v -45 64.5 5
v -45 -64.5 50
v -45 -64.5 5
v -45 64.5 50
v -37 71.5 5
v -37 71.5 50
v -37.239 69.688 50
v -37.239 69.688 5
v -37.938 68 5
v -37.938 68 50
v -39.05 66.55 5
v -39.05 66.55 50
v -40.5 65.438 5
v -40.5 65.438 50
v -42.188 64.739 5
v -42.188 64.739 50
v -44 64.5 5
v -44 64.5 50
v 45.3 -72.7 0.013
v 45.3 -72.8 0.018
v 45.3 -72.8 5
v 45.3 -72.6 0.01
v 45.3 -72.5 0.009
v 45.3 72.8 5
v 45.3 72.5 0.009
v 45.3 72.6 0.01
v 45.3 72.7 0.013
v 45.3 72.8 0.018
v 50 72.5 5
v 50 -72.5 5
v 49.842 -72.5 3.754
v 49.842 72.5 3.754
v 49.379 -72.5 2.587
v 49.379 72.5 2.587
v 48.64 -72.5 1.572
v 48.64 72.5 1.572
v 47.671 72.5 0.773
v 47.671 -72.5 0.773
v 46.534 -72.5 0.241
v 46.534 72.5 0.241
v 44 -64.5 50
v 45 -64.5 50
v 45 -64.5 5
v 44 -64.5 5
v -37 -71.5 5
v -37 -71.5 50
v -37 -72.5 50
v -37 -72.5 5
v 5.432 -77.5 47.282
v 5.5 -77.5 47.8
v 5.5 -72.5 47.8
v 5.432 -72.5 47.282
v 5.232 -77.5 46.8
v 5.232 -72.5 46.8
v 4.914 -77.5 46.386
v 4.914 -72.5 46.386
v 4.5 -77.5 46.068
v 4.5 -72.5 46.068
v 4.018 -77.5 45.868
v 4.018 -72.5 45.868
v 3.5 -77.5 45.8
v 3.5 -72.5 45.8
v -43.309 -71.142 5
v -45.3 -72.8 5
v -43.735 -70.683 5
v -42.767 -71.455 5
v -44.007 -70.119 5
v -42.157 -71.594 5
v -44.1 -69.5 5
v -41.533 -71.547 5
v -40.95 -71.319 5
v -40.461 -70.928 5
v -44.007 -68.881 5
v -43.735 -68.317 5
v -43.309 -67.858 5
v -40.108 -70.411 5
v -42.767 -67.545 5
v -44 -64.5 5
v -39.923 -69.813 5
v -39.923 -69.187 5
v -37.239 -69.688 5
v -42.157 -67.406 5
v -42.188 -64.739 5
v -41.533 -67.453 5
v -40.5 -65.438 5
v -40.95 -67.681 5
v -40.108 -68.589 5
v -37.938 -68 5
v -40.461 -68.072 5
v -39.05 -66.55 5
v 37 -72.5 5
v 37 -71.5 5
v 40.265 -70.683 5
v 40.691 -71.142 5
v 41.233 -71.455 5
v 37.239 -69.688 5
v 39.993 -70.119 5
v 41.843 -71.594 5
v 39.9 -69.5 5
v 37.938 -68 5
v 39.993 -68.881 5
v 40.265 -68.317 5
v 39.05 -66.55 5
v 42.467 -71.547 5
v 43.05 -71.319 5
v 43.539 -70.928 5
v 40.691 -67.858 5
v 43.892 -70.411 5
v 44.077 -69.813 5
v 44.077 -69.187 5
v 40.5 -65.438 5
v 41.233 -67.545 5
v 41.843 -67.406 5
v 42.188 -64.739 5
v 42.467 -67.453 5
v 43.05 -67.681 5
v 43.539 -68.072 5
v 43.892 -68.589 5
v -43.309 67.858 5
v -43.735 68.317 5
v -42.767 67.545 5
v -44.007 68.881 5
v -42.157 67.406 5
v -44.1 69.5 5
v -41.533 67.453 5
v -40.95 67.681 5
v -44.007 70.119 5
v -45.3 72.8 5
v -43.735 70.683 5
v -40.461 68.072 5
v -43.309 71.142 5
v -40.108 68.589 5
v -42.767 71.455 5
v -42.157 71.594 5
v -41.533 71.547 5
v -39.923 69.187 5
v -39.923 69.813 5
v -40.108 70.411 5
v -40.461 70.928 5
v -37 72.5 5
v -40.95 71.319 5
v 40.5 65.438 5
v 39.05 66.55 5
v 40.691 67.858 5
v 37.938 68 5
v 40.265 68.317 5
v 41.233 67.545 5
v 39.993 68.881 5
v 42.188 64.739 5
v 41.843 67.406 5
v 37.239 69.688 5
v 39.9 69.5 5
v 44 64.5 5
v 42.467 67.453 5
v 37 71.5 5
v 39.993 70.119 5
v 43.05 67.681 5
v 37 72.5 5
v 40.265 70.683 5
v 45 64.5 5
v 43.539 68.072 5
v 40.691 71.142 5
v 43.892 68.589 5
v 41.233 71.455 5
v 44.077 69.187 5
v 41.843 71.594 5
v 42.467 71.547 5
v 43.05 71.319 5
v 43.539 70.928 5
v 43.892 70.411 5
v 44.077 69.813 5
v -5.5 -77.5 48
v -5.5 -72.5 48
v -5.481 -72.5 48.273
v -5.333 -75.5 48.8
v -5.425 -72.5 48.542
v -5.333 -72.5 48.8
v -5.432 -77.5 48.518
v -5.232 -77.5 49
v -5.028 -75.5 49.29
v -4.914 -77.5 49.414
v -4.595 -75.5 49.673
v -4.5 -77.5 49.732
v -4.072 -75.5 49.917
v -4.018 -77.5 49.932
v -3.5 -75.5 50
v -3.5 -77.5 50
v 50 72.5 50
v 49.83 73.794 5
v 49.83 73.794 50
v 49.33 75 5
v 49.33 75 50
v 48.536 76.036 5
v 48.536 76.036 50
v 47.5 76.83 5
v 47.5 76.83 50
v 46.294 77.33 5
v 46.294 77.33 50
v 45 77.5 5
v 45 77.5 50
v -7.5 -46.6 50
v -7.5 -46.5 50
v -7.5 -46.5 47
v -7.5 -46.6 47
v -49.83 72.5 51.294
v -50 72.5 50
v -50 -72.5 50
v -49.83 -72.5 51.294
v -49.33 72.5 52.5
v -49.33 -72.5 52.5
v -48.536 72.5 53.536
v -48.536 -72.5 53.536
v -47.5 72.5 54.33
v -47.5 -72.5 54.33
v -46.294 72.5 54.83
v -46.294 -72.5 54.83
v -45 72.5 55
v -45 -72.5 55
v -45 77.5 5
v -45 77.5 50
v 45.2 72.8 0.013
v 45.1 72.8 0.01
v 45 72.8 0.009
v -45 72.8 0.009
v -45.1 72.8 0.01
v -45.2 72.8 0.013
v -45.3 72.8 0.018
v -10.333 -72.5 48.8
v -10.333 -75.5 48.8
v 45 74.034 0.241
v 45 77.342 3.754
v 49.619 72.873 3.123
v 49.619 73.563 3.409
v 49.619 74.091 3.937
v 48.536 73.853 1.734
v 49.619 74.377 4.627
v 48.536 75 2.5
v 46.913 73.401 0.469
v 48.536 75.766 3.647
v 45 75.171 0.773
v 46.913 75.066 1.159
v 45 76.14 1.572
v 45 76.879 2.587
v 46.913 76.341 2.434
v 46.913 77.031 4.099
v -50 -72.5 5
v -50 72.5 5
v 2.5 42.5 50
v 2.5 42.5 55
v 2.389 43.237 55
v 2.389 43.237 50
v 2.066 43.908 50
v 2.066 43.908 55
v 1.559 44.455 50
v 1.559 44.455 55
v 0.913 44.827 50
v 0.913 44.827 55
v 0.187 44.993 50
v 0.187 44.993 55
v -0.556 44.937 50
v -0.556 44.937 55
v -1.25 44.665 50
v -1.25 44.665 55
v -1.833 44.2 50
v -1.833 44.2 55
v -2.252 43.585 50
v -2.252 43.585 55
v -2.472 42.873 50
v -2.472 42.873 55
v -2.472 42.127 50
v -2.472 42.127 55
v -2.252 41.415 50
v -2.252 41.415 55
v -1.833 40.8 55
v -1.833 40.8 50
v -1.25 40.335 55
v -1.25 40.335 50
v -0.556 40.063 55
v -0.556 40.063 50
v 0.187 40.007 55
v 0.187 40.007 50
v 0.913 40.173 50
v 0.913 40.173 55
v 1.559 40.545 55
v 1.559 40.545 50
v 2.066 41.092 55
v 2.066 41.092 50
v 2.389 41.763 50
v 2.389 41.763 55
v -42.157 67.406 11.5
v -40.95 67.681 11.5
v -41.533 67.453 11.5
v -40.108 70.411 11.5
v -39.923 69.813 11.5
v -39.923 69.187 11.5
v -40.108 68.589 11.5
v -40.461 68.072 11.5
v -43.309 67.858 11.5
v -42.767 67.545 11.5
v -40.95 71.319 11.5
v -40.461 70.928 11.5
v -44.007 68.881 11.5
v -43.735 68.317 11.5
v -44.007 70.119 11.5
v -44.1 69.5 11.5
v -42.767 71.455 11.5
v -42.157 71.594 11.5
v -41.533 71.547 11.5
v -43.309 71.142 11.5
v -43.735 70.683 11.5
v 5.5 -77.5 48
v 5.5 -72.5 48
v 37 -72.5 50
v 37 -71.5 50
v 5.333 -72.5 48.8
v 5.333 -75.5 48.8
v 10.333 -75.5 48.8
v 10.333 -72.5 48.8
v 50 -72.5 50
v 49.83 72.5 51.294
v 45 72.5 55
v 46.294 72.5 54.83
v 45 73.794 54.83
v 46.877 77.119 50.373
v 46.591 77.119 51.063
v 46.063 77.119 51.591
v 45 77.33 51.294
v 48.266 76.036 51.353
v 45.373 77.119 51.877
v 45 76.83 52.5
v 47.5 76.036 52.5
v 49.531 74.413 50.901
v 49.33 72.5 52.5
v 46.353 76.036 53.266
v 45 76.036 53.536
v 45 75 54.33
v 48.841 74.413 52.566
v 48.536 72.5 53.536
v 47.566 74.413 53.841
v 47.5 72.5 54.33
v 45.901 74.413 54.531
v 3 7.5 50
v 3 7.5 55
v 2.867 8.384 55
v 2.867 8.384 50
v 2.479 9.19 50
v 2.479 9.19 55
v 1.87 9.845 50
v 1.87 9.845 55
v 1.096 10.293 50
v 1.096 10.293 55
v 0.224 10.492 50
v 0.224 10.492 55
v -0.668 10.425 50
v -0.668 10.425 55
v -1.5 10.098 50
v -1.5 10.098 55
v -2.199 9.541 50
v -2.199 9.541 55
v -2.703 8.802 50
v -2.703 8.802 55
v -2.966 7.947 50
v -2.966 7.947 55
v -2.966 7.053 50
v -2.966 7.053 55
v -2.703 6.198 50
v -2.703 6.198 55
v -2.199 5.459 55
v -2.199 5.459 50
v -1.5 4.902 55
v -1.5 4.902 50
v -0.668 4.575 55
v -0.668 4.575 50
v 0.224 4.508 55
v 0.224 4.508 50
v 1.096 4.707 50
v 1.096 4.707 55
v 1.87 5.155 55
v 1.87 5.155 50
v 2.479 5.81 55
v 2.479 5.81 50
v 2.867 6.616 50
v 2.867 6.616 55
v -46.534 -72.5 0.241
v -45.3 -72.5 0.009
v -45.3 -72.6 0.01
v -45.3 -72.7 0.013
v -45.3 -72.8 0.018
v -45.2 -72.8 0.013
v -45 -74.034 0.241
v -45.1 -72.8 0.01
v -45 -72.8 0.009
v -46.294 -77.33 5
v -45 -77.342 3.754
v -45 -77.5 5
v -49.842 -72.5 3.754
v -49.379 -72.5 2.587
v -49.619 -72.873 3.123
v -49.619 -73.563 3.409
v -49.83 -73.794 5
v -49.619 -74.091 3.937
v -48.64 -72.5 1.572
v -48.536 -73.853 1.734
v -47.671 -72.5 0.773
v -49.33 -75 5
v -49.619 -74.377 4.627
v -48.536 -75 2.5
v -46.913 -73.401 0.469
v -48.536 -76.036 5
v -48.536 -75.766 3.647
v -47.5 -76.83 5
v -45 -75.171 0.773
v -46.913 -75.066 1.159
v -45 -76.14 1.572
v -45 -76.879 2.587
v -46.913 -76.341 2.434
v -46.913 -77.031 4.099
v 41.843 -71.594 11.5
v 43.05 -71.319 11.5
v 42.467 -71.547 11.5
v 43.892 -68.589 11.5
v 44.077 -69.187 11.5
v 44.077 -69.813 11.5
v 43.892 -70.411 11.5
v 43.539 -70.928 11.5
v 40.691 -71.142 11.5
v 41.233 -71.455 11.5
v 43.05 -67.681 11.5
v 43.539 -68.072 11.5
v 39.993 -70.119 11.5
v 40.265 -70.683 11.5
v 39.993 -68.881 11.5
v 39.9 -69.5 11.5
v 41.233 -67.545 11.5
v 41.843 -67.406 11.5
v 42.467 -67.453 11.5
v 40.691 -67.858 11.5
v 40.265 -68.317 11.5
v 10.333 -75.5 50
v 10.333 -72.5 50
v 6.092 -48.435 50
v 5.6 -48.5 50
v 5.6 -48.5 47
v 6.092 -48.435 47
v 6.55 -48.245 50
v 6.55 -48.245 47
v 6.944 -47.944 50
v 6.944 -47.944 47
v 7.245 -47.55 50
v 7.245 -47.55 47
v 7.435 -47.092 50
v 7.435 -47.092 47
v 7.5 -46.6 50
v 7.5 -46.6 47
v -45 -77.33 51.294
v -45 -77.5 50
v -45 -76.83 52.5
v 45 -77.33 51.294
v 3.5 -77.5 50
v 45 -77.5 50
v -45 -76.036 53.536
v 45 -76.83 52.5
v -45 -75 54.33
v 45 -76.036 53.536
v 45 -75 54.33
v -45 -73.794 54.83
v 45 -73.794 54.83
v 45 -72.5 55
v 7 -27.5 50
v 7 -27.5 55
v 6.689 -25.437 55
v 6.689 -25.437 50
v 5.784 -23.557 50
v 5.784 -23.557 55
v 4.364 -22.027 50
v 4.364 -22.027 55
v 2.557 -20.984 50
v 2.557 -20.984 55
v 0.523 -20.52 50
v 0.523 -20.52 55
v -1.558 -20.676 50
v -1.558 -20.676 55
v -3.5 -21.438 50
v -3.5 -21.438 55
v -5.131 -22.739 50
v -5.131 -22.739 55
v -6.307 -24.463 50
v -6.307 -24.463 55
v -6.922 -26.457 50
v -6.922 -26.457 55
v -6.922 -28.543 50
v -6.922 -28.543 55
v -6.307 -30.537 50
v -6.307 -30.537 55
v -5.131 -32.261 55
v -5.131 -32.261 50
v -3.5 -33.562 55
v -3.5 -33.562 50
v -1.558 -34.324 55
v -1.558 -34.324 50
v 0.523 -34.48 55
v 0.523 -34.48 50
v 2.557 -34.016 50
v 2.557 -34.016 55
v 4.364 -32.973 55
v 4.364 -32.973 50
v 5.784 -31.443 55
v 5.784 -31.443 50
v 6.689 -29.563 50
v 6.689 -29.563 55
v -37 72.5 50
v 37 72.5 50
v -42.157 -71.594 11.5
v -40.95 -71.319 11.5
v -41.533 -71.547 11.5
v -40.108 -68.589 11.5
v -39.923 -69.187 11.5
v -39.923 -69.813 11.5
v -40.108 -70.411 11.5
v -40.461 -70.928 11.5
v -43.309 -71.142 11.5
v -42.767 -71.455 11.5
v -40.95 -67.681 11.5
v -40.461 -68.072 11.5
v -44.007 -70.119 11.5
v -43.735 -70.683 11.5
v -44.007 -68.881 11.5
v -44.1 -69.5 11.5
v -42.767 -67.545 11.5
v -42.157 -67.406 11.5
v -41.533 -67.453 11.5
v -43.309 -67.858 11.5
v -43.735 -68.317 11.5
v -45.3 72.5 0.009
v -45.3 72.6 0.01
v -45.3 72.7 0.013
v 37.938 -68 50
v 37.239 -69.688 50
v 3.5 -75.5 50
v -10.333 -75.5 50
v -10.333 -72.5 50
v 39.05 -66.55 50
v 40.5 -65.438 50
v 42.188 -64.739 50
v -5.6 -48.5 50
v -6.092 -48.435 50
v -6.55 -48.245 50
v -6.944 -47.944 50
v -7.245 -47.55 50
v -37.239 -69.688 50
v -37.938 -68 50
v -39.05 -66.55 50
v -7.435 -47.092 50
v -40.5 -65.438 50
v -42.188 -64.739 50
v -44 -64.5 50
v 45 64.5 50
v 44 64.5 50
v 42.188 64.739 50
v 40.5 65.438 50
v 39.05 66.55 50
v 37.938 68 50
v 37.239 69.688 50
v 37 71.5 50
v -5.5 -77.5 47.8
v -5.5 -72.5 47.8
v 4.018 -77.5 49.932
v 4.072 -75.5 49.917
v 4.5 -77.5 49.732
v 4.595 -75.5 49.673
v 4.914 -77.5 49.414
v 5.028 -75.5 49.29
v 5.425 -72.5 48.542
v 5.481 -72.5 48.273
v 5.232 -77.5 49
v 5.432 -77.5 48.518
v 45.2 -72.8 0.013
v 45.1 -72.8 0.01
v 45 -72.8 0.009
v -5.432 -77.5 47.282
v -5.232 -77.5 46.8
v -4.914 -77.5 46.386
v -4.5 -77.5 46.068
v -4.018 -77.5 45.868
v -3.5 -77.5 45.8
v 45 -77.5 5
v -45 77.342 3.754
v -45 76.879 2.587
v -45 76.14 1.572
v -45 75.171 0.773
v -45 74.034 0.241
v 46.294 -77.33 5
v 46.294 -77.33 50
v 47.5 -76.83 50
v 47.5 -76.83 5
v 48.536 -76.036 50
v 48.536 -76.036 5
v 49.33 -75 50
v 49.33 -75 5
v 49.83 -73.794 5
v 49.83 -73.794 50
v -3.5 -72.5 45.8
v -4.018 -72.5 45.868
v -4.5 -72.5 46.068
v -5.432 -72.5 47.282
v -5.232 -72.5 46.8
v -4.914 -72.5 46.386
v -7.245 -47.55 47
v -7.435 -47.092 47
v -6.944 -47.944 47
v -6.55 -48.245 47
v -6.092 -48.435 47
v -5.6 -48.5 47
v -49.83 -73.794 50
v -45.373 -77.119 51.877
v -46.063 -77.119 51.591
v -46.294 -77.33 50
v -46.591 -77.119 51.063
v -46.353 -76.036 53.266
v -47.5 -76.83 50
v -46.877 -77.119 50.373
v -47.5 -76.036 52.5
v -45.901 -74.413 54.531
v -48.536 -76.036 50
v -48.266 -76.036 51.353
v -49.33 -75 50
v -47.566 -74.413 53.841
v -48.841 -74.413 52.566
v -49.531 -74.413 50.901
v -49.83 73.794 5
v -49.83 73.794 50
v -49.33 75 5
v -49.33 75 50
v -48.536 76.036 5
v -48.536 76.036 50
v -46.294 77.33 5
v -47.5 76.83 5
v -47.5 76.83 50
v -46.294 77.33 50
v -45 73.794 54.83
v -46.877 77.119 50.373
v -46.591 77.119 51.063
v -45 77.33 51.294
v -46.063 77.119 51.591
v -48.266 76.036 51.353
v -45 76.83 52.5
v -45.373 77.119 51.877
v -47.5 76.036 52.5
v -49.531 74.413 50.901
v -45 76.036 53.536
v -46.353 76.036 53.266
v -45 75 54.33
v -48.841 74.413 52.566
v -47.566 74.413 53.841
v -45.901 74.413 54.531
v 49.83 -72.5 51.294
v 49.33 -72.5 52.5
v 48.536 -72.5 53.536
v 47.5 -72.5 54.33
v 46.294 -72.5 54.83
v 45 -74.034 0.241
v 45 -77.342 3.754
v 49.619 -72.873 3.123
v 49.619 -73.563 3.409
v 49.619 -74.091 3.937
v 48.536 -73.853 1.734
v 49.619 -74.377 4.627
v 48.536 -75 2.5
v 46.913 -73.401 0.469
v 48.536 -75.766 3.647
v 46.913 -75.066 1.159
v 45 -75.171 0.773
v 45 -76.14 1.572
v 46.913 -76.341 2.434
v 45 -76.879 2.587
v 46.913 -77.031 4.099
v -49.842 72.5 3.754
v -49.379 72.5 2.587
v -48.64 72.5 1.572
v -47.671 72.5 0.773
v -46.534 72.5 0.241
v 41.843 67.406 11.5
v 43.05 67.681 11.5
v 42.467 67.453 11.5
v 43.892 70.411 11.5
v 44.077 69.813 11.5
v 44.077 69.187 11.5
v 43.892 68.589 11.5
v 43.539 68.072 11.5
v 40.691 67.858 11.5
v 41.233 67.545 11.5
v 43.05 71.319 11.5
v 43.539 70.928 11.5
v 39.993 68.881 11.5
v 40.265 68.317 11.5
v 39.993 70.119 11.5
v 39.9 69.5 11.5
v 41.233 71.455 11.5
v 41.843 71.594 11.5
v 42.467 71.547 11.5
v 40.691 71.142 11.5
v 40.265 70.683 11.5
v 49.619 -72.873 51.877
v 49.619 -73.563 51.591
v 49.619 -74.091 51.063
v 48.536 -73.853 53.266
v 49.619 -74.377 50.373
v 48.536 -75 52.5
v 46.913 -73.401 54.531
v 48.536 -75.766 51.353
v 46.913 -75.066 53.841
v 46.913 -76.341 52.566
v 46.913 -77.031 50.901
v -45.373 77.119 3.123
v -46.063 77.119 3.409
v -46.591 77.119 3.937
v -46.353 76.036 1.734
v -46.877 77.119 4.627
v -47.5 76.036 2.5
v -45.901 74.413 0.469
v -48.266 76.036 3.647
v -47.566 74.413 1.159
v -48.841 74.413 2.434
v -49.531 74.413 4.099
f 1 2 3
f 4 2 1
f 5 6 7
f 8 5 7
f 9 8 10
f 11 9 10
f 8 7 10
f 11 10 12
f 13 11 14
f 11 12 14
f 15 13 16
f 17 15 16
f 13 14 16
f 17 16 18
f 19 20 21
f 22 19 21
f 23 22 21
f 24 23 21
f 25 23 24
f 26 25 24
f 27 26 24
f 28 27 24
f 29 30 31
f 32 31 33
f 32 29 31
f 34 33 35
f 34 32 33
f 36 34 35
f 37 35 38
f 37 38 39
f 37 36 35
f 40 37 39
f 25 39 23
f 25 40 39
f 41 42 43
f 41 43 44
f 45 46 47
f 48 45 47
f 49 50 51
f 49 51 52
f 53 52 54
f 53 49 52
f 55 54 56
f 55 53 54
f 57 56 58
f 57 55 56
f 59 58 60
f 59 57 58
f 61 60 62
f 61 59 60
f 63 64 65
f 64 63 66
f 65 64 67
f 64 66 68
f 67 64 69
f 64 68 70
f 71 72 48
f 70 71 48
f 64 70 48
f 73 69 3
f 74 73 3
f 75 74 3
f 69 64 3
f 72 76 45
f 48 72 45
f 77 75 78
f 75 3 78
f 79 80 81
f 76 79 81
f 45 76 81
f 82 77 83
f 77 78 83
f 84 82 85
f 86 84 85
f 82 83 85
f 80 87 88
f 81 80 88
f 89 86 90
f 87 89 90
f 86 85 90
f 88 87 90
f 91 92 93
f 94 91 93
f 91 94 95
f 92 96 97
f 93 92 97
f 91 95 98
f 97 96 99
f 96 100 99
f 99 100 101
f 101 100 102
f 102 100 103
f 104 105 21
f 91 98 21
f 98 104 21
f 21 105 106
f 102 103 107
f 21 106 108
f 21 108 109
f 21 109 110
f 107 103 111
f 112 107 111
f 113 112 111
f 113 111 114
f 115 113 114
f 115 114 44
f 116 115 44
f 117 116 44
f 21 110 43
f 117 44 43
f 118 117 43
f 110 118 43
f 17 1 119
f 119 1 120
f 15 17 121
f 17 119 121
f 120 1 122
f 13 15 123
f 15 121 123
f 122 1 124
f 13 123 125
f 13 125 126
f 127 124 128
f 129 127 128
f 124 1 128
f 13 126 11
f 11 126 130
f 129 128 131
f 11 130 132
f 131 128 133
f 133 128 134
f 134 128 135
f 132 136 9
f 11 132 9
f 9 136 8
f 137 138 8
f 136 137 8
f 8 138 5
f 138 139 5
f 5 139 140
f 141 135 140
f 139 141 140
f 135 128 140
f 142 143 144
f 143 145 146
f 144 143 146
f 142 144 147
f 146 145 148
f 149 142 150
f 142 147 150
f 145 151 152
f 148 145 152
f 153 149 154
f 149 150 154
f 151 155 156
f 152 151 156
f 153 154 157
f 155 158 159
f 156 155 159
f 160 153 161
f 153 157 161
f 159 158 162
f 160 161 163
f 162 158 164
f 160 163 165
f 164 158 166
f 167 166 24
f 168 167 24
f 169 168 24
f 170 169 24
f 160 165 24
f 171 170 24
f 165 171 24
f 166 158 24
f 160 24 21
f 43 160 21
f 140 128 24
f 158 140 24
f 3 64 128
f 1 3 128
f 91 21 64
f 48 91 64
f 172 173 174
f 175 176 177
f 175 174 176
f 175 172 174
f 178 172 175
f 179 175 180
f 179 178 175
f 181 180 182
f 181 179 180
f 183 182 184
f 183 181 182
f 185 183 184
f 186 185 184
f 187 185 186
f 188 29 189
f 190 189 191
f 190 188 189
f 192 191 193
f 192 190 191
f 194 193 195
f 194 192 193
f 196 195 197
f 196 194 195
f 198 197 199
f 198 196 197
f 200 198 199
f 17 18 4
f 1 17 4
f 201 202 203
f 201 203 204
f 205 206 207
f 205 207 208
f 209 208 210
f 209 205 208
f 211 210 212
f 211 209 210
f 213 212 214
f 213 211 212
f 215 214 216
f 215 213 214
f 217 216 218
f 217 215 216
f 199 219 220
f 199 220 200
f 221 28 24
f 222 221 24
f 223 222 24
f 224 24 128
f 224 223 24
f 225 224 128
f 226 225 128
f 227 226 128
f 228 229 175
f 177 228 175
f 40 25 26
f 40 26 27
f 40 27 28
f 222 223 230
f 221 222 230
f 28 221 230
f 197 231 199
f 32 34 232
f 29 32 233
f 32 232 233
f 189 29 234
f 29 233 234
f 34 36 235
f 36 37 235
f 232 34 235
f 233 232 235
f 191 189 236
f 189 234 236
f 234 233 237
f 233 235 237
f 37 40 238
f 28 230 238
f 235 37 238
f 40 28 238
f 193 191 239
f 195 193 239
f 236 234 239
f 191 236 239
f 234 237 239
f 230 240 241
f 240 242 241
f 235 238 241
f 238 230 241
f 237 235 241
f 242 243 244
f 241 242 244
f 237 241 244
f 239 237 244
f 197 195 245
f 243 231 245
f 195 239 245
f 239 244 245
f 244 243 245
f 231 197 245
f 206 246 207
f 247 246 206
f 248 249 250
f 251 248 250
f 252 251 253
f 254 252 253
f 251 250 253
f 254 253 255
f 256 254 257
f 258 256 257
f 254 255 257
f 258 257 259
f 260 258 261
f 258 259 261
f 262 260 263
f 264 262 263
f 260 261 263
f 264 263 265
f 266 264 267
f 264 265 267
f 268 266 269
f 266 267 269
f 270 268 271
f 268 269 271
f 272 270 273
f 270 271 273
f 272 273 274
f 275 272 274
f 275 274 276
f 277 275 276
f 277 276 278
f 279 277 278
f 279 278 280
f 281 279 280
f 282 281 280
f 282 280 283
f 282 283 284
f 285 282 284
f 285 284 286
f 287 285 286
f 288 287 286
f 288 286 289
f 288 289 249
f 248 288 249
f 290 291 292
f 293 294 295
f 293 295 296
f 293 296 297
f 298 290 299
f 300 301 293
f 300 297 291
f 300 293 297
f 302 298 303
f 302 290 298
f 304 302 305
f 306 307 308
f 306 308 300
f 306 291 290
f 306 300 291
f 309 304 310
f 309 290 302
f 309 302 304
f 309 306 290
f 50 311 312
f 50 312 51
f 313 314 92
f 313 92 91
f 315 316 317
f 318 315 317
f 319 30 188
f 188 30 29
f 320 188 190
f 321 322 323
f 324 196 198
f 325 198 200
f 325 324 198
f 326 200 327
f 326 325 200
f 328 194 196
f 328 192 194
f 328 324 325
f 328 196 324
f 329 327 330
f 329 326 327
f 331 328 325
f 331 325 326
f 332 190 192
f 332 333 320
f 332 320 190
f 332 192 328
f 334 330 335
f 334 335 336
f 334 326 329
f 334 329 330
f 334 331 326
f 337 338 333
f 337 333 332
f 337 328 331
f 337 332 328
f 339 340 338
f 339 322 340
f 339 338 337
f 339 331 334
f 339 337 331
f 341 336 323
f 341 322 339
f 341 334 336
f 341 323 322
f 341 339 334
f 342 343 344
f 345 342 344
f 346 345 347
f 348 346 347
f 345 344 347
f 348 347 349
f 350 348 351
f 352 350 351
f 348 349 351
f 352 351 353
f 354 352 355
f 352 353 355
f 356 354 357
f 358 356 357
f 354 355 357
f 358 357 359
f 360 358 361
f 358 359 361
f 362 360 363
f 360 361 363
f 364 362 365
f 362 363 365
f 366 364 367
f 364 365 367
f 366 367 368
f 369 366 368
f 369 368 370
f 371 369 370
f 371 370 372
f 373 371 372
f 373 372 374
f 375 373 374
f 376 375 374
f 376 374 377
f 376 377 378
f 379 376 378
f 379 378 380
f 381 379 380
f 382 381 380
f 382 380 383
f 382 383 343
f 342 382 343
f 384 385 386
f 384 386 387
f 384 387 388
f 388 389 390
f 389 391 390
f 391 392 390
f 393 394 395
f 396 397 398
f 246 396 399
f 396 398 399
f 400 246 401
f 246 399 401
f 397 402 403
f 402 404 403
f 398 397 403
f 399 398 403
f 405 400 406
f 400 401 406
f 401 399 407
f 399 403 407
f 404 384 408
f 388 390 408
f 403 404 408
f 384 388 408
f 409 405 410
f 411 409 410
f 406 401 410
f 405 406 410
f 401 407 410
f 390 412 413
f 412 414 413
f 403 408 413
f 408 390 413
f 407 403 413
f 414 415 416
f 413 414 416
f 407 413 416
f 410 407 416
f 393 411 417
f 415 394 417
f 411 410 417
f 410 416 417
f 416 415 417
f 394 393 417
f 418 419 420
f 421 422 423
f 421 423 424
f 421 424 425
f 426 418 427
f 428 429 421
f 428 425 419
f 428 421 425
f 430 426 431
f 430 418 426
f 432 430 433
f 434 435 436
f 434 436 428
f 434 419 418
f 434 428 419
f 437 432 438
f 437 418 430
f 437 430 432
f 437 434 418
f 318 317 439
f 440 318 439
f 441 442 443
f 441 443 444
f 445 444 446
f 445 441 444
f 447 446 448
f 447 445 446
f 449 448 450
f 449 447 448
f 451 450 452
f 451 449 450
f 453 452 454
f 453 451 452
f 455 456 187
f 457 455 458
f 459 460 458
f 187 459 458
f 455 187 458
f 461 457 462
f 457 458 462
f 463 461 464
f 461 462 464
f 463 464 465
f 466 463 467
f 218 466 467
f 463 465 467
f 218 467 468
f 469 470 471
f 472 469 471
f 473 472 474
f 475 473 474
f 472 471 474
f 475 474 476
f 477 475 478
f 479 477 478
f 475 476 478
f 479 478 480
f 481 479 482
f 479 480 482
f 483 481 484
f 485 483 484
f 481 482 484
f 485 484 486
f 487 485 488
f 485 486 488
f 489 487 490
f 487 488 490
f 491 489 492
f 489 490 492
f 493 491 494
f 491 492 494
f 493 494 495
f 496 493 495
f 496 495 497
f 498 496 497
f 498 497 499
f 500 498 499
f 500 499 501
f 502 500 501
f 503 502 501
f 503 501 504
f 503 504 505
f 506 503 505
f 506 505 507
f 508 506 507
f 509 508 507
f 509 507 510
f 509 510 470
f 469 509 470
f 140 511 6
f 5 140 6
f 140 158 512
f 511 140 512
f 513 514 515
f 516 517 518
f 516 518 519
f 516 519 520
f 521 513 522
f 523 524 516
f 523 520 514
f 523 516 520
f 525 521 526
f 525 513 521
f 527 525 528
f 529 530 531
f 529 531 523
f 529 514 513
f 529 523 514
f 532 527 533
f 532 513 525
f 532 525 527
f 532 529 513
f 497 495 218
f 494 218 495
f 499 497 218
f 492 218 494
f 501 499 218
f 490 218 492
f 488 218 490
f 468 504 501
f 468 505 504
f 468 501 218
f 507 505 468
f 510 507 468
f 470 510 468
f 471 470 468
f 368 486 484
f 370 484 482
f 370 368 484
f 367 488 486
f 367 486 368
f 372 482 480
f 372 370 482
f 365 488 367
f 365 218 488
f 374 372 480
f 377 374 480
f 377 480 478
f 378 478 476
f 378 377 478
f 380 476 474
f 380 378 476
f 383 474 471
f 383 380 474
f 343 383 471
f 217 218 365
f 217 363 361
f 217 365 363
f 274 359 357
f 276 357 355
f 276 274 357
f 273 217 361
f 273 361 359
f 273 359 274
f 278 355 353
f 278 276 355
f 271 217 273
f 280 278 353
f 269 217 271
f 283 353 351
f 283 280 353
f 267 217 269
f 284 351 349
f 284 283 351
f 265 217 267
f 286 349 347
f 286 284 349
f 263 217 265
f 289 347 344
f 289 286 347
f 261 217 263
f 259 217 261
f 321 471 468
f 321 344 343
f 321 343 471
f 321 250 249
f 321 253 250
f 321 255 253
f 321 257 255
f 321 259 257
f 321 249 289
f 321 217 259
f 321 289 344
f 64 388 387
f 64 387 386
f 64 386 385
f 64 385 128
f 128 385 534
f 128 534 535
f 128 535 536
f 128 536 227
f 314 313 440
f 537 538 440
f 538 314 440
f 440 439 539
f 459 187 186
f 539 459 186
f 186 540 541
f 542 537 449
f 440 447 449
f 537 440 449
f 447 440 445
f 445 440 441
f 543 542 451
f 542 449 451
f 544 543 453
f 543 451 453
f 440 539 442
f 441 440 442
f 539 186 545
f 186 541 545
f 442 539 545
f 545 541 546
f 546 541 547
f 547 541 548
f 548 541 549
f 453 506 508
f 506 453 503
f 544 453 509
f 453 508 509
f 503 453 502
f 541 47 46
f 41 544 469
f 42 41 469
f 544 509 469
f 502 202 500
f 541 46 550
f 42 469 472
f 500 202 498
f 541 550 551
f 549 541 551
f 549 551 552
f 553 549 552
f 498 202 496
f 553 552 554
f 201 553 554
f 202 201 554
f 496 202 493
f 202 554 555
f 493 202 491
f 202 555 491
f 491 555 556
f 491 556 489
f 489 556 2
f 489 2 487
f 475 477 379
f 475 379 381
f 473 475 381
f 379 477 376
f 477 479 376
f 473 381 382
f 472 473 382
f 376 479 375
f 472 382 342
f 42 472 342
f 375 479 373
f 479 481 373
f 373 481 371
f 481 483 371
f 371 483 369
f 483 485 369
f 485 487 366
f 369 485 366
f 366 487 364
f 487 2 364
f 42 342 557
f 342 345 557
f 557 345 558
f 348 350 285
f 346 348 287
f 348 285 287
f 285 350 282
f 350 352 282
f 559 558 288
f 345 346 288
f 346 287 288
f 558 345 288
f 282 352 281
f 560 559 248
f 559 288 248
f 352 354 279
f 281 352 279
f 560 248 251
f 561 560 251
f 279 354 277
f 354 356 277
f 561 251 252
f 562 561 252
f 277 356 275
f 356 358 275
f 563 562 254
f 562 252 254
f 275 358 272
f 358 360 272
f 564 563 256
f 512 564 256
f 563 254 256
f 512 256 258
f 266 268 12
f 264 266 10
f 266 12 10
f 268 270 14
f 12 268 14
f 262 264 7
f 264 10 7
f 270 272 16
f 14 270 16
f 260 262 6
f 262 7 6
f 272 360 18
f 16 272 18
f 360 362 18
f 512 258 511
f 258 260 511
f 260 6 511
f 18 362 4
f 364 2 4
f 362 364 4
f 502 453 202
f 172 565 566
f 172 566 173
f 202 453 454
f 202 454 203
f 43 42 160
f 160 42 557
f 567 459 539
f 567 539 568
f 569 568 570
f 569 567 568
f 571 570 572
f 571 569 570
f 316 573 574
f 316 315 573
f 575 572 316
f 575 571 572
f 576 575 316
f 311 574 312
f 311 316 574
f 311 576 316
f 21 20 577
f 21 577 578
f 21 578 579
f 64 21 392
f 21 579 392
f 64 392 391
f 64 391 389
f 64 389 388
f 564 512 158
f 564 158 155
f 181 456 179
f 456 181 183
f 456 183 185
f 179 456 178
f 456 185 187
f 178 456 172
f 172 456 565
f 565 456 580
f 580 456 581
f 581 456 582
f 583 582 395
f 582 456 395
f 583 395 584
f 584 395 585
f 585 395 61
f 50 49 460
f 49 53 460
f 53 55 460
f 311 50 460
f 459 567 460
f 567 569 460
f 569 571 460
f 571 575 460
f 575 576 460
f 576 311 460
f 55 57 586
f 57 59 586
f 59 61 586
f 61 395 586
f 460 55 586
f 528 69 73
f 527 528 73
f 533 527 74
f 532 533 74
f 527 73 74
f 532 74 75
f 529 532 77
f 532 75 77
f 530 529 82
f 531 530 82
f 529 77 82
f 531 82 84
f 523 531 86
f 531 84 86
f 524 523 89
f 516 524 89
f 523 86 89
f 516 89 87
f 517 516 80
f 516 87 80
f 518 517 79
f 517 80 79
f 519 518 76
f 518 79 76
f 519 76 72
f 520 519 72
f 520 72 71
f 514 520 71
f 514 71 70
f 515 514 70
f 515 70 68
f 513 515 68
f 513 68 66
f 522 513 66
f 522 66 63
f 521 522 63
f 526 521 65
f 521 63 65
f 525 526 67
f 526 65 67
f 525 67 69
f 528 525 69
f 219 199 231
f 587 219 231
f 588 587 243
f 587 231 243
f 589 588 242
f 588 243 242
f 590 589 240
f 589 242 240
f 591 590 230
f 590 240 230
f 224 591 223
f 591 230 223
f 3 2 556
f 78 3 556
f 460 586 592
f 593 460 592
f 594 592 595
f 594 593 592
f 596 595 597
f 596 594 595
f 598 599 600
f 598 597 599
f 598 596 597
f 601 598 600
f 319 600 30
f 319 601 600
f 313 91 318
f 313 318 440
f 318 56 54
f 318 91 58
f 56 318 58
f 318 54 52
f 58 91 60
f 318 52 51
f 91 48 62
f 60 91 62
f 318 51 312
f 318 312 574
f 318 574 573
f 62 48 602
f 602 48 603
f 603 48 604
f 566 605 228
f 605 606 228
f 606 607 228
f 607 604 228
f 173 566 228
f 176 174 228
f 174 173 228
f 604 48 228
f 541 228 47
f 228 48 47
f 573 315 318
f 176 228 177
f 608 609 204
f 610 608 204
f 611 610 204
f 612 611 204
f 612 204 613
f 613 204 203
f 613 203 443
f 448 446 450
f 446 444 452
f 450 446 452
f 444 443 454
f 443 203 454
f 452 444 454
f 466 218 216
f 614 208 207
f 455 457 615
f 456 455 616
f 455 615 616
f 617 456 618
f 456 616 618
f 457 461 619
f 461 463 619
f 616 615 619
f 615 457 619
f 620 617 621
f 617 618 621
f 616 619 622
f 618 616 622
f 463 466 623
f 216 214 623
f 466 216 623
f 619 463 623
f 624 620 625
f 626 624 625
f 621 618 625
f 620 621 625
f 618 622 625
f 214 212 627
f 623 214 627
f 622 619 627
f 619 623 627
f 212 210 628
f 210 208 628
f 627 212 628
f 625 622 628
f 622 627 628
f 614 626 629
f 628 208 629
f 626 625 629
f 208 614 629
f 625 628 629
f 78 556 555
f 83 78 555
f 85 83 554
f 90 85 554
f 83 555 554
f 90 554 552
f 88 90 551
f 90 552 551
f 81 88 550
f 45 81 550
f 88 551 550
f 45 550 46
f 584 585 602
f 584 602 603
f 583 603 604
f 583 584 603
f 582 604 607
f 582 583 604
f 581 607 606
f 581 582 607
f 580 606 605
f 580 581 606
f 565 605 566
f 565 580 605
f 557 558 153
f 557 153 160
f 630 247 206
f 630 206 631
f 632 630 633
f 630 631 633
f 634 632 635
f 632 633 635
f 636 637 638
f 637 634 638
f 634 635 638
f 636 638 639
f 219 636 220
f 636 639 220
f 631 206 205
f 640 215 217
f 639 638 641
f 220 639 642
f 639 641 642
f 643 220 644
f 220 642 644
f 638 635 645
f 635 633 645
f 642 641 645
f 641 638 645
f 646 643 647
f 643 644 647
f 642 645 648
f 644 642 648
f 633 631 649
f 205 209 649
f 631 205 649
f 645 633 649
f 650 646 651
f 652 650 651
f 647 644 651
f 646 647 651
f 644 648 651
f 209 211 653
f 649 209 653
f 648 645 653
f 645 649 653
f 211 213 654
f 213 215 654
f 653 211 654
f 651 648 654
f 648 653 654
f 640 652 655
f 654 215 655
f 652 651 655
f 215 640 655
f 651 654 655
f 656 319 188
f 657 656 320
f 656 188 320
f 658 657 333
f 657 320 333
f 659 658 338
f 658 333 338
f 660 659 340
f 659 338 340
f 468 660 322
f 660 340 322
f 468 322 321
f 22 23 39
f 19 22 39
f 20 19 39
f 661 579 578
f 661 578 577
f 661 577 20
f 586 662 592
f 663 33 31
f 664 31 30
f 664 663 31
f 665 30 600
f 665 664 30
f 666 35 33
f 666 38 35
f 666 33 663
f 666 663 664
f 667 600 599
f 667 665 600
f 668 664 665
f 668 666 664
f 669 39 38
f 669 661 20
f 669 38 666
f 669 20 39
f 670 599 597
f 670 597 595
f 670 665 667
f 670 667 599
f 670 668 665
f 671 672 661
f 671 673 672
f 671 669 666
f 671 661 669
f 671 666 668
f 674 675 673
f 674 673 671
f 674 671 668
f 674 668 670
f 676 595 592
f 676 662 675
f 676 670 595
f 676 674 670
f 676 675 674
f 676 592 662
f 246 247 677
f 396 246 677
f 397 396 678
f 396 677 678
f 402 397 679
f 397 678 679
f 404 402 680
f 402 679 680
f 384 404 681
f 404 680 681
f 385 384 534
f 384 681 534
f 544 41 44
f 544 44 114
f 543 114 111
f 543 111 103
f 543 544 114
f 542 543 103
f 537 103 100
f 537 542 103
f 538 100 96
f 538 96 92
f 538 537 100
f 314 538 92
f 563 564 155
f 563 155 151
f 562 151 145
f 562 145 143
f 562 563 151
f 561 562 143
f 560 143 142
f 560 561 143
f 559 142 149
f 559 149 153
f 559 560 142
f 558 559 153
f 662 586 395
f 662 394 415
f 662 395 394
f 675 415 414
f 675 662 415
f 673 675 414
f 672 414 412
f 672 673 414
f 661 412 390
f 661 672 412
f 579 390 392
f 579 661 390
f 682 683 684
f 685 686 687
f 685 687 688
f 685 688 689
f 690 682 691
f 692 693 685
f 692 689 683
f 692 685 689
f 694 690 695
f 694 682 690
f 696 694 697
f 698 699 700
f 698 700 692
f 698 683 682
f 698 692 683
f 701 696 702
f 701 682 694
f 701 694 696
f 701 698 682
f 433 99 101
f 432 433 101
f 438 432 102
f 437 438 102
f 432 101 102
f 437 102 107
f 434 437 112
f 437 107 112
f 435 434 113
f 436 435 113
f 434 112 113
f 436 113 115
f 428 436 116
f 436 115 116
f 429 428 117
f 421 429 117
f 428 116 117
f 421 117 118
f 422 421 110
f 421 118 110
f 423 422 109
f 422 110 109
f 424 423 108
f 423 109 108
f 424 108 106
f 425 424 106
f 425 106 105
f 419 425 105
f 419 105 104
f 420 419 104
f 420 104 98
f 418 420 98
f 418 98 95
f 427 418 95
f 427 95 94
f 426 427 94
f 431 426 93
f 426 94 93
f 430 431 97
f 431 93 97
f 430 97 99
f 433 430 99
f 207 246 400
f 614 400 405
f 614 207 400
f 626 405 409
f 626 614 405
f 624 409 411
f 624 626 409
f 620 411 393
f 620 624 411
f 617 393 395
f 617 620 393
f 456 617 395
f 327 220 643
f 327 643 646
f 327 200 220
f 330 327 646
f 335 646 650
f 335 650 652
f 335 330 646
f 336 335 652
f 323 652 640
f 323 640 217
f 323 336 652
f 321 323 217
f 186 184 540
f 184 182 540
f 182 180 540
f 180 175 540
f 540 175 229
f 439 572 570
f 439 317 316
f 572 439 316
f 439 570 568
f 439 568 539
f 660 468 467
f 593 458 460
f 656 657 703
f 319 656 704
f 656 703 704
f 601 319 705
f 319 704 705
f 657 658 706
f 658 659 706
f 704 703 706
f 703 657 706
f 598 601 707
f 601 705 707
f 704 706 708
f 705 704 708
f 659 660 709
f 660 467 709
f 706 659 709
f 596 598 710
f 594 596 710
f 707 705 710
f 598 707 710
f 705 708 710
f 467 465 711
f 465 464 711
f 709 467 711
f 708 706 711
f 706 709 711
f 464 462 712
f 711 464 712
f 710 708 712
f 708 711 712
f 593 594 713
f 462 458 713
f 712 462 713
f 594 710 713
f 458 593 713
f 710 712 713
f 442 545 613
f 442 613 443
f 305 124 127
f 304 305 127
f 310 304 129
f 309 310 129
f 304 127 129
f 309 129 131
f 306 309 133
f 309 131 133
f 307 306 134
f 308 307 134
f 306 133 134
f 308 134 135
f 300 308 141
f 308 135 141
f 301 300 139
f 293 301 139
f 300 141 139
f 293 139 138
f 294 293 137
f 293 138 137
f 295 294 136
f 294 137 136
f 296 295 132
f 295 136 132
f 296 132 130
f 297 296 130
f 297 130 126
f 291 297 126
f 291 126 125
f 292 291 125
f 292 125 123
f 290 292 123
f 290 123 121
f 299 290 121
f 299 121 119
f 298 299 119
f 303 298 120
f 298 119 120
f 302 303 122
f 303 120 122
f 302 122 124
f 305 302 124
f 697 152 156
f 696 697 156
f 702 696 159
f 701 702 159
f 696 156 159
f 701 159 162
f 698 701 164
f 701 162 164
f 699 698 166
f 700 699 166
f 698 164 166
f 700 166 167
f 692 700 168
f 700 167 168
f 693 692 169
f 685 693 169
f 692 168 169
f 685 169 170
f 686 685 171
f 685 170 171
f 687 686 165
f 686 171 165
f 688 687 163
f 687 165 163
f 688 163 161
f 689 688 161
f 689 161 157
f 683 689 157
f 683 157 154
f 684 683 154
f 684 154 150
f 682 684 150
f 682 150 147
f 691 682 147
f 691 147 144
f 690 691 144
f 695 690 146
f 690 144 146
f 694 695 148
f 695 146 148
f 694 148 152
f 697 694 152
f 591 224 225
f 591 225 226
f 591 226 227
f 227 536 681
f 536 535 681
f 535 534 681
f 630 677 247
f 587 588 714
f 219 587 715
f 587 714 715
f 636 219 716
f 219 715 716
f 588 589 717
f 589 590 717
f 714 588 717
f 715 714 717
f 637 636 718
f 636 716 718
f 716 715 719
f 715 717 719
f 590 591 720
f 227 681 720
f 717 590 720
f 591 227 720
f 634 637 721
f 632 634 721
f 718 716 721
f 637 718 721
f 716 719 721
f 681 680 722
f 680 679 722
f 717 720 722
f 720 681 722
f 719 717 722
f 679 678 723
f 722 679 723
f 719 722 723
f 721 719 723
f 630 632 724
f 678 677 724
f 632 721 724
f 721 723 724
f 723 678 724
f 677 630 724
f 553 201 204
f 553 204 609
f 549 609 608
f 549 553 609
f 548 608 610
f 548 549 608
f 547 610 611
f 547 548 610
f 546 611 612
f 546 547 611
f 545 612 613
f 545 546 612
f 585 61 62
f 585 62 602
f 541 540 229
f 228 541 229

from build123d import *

# Parameters (mm, degrees)
SKETCH6_W           = 100
SKETCH6_H           = 155
BOSS_EXTRUDE5_DEPTH = 55
FILLET2_R           = 5
SHELL3_START        = -45
SHELL3_OUTLINE_W    = 145
SHELL3_OUTLINE_H    = 50
SHELL3_DEPTH        = 90
BOSS_EXTRUDE6_DEPTH = 45
SKETCH8_R           = 2.1
CUT_EXTRUDE1_DEPTH  = 6.5
SKETCH9_R           = 2.5
SKETCH9_R_2         = 3
SKETCH9_R_3         = 7
CUT_EXTRUDE2_DEPTH  = 108.383657975
CUT_EXTRUDE3_REACH  = 173.901
CUT_EXTRUDE4_START  = -3
CUT_EXTRUDE4_DEPTH  = 3
BOSS_EXTRUDE7_DEPTH = 3
SKETCH15_W          = 90.6
SKETCH15_H          = 145.6
CUT_EXTRUDE5_DEPTH  = 5


# Read off the part's stored shape, not the designer's step: Shell3
with BuildPart() as part:
    # Sketch6 → Boss-Extrude5 (new body)
    with BuildSketch(Plane.XY):
        Rectangle(SKETCH6_W, SKETCH6_H)
    extrude(amount=BOSS_EXTRUDE5_DEPTH)

    # Fillet2
    fillet2_edges = [part.edges().sort_by_distance(p)[0] for p in [
        (-50, 0, 55),
        (0, -77.5, 55),
        (50, 0, 55),
        (0, -77.5, 0),
        (-50, 0, 0),
        (0, 77.5, 0),
        (50, 0, 0),
        (50, -77.5, 27.5),
        (-50, -77.5, 27.5),
        (-50, 77.5, 27.5),
        (50, 77.5, 27.5),
        (0, 77.5, 55),
    ]]
    fillet(fillet2_edges, radius=FILLET2_R)

    # Shell3 outline → Shell3 (cut)
    with BuildSketch(Plane.YZ.offset(SHELL3_START)):
        with Locations((0, 25)):
            Rectangle(SHELL3_OUTLINE_W, SHELL3_OUTLINE_H)
    extrude(amount=SHELL3_DEPTH, mode=Mode.SUBTRACT)

    # Sketch7 → Boss-Extrude6 (add)
    with BuildSketch(Plane(origin=(0, 0, 50), x_dir=(-1, 0, 0), z_dir=(0, 0, -1))):
        with BuildLine():
            Line((-45, 72.5), (-37, 72.5))
            Line((-37, 72.5), (-37, 71.5))
            ThreePointArc((-37, 71.5), (-39.050252532, 66.550252532), (-44, 64.5))
            Line((-44, 64.5), (-45, 64.5))
            Line((-45, 64.5), (-45, 72.5))
        make_face()
        with BuildLine():
            Line((45, 72.5), (37, 72.5))
            Line((37, 72.5), (37, 71.5))
            ThreePointArc((37, 71.5), (39.050252532, 66.550252532), (44, 64.5))
            Line((44, 64.5), (45, 64.5))
            Line((45, 64.5), (45, 72.5))
        make_face()
        with BuildLine():
            Line((-45, -64.5), (-44, -64.5))
            ThreePointArc((-44, -64.5), (-39.050252532, -66.550252532), (-37, -71.5))
            Line((-37, -71.5), (-37, -72.5))
            Line((-37, -72.5), (-45, -72.5))
            Line((-45, -72.5), (-45, -64.5))
        make_face()
        with BuildLine():
            Line((45, -72.5), (45, -64.5))
            Line((45, -64.5), (44, -64.5))
            ThreePointArc((44, -64.5), (39.050252532, -66.550252532), (37, -71.5))
            Line((37, -71.5), (37, -72.5))
            Line((37, -72.5), (45, -72.5))
        make_face()
    extrude(amount=BOSS_EXTRUDE6_DEPTH)

    # Sketch8 → Cut-Extrude1 (cut)
    with BuildSketch(Plane(origin=(0, 0, 5), x_dir=(-1, 0, 0), z_dir=(0, 0, -1))):
        with Locations((-42, 69.5)):
            Circle(SKETCH8_R)
        with Locations((42, 69.5)):
            Circle(SKETCH8_R)
        with Locations((42, -69.5)):
            Circle(SKETCH8_R)
        with Locations((-42, -69.5)):
            Circle(SKETCH8_R)
    extrude(amount=-CUT_EXTRUDE1_DEPTH, mode=Mode.SUBTRACT)

    # Sketch9 → Cut-Extrude2 (cut, through all)
    with BuildSketch(Plane.XY.offset(55)):
        with Locations((0, 42.5)):
            Circle(SKETCH9_R)
        with Locations((0, 7.5)):
            Circle(SKETCH9_R_2)
        with Locations((0, -27.5)):
            Circle(SKETCH9_R_3)
    extrude(amount=-CUT_EXTRUDE2_DEPTH, mode=Mode.SUBTRACT)

    # Sketch10 → Cut-Extrude3 (cut, up to next)
    with BuildSketch(Plane.XZ.offset(77.5), mode=Mode.PRIVATE) as cut_extrude3_sk1:
        with BuildLine():
            Line((-3.5, 50), (3.5, 50))
            ThreePointArc((3.5, 50), (4.914213562, 49.414213562), (5.5, 48))
            Line((5.5, 48), (5.5, 47.8))
            ThreePointArc((5.5, 47.8), (4.914213562, 46.385786438), (3.5, 45.8))
            Line((3.5, 45.8), (-3.5, 45.8))
            ThreePointArc((-3.5, 45.8), (-4.914213562, 46.385786438), (-5.5, 47.8))
            Line((-5.5, 47.8), (-5.5, 48))
            ThreePointArc((-5.5, 48), (-4.914213562, 49.414213562), (-3.5, 50))
        make_face()
    cut_extrude3_tool1 = extrude(cut_extrude3_sk1.sketch, amount=-CUT_EXTRUDE3_REACH, mode=Mode.PRIVATE) & part.part
    add(cut_extrude3_tool1.solids().sort_by_distance((0, -77.5, 47.9))[0], mode=Mode.SUBTRACT)

    # Sketch13 → Cut-Extrude4 (cut)
    with BuildSketch(Plane(origin=(0, -72.5, 0), x_dir=(1, 0, 0), z_dir=(0, 1, 0)).offset(CUT_EXTRUDE4_START)):
        with BuildLine():
            Line((5.5, -47.8), (5.5, -48))
            ThreePointArc((5.5, -48), (5.457812626, -48.408619287), (5.333030278, -48.8))
            Line((5.333030278, -48.8), (10.333030278, -48.8))
            Line((10.333030278, -48.8), (10.333030278, -50))
            Line((10.333030278, -50), (3.5, -50))
            Line((3.5, -50), (-3.5, -50))
            Line((-3.5, -50), (-10.333030278, -50))
            Line((-10.333030278, -50), (-10.333030278, -48.8))
            Line((-10.333030278, -48.8), (-5.333030278, -48.8))
            ThreePointArc((-5.333030278, -48.8), (-5.457812626, -48.408619287), (-5.5, -48))
            Line((-5.5, -48), (-5.5, -47.8))
            ThreePointArc((-5.5, -47.8), (-4.914213562, -46.385786438), (-3.5, -45.8))
            Line((-3.5, -45.8), (3.5, -45.8))
            ThreePointArc((3.5, -45.8), (4.914213562, -46.385786438), (5.5, -47.8))
        make_face()
    extrude(amount=CUT_EXTRUDE4_DEPTH, mode=Mode.SUBTRACT)

    # Sketch14 → Boss-Extrude7 (add)
    with BuildSketch(Plane(origin=(0, 0, 50), x_dir=(-1, 0, 0), z_dir=(0, 0, -1))):
        with BuildLine():
            Line((-7.5, -46.6), (7.5, -46.5))
            Line((7.5, -46.5), (7.5, -46.6))
            ThreePointArc((7.5, -46.6), (6.943502884, -47.943502884), (5.6, -48.5))
            Line((5.6, -48.5), (-5.6, -48.5))
            ThreePointArc((-5.6, -48.5), (-6.943502884, -47.943502884), (-7.5, -46.6))
        make_face()
    extrude(amount=BOSS_EXTRUDE7_DEPTH)

    # Sketch15 → Cut-Extrude5 (cut)
    with BuildSketch(Plane(origin=(0, 0, 0), x_dir=(-1, 0, 0), z_dir=(0, 0, -1))):
        Rectangle(SKETCH15_W, SKETCH15_H)
    extrude(amount=-CUT_EXTRUDE5_DEPTH, mode=Mode.SUBTRACT)


solid = part.part
